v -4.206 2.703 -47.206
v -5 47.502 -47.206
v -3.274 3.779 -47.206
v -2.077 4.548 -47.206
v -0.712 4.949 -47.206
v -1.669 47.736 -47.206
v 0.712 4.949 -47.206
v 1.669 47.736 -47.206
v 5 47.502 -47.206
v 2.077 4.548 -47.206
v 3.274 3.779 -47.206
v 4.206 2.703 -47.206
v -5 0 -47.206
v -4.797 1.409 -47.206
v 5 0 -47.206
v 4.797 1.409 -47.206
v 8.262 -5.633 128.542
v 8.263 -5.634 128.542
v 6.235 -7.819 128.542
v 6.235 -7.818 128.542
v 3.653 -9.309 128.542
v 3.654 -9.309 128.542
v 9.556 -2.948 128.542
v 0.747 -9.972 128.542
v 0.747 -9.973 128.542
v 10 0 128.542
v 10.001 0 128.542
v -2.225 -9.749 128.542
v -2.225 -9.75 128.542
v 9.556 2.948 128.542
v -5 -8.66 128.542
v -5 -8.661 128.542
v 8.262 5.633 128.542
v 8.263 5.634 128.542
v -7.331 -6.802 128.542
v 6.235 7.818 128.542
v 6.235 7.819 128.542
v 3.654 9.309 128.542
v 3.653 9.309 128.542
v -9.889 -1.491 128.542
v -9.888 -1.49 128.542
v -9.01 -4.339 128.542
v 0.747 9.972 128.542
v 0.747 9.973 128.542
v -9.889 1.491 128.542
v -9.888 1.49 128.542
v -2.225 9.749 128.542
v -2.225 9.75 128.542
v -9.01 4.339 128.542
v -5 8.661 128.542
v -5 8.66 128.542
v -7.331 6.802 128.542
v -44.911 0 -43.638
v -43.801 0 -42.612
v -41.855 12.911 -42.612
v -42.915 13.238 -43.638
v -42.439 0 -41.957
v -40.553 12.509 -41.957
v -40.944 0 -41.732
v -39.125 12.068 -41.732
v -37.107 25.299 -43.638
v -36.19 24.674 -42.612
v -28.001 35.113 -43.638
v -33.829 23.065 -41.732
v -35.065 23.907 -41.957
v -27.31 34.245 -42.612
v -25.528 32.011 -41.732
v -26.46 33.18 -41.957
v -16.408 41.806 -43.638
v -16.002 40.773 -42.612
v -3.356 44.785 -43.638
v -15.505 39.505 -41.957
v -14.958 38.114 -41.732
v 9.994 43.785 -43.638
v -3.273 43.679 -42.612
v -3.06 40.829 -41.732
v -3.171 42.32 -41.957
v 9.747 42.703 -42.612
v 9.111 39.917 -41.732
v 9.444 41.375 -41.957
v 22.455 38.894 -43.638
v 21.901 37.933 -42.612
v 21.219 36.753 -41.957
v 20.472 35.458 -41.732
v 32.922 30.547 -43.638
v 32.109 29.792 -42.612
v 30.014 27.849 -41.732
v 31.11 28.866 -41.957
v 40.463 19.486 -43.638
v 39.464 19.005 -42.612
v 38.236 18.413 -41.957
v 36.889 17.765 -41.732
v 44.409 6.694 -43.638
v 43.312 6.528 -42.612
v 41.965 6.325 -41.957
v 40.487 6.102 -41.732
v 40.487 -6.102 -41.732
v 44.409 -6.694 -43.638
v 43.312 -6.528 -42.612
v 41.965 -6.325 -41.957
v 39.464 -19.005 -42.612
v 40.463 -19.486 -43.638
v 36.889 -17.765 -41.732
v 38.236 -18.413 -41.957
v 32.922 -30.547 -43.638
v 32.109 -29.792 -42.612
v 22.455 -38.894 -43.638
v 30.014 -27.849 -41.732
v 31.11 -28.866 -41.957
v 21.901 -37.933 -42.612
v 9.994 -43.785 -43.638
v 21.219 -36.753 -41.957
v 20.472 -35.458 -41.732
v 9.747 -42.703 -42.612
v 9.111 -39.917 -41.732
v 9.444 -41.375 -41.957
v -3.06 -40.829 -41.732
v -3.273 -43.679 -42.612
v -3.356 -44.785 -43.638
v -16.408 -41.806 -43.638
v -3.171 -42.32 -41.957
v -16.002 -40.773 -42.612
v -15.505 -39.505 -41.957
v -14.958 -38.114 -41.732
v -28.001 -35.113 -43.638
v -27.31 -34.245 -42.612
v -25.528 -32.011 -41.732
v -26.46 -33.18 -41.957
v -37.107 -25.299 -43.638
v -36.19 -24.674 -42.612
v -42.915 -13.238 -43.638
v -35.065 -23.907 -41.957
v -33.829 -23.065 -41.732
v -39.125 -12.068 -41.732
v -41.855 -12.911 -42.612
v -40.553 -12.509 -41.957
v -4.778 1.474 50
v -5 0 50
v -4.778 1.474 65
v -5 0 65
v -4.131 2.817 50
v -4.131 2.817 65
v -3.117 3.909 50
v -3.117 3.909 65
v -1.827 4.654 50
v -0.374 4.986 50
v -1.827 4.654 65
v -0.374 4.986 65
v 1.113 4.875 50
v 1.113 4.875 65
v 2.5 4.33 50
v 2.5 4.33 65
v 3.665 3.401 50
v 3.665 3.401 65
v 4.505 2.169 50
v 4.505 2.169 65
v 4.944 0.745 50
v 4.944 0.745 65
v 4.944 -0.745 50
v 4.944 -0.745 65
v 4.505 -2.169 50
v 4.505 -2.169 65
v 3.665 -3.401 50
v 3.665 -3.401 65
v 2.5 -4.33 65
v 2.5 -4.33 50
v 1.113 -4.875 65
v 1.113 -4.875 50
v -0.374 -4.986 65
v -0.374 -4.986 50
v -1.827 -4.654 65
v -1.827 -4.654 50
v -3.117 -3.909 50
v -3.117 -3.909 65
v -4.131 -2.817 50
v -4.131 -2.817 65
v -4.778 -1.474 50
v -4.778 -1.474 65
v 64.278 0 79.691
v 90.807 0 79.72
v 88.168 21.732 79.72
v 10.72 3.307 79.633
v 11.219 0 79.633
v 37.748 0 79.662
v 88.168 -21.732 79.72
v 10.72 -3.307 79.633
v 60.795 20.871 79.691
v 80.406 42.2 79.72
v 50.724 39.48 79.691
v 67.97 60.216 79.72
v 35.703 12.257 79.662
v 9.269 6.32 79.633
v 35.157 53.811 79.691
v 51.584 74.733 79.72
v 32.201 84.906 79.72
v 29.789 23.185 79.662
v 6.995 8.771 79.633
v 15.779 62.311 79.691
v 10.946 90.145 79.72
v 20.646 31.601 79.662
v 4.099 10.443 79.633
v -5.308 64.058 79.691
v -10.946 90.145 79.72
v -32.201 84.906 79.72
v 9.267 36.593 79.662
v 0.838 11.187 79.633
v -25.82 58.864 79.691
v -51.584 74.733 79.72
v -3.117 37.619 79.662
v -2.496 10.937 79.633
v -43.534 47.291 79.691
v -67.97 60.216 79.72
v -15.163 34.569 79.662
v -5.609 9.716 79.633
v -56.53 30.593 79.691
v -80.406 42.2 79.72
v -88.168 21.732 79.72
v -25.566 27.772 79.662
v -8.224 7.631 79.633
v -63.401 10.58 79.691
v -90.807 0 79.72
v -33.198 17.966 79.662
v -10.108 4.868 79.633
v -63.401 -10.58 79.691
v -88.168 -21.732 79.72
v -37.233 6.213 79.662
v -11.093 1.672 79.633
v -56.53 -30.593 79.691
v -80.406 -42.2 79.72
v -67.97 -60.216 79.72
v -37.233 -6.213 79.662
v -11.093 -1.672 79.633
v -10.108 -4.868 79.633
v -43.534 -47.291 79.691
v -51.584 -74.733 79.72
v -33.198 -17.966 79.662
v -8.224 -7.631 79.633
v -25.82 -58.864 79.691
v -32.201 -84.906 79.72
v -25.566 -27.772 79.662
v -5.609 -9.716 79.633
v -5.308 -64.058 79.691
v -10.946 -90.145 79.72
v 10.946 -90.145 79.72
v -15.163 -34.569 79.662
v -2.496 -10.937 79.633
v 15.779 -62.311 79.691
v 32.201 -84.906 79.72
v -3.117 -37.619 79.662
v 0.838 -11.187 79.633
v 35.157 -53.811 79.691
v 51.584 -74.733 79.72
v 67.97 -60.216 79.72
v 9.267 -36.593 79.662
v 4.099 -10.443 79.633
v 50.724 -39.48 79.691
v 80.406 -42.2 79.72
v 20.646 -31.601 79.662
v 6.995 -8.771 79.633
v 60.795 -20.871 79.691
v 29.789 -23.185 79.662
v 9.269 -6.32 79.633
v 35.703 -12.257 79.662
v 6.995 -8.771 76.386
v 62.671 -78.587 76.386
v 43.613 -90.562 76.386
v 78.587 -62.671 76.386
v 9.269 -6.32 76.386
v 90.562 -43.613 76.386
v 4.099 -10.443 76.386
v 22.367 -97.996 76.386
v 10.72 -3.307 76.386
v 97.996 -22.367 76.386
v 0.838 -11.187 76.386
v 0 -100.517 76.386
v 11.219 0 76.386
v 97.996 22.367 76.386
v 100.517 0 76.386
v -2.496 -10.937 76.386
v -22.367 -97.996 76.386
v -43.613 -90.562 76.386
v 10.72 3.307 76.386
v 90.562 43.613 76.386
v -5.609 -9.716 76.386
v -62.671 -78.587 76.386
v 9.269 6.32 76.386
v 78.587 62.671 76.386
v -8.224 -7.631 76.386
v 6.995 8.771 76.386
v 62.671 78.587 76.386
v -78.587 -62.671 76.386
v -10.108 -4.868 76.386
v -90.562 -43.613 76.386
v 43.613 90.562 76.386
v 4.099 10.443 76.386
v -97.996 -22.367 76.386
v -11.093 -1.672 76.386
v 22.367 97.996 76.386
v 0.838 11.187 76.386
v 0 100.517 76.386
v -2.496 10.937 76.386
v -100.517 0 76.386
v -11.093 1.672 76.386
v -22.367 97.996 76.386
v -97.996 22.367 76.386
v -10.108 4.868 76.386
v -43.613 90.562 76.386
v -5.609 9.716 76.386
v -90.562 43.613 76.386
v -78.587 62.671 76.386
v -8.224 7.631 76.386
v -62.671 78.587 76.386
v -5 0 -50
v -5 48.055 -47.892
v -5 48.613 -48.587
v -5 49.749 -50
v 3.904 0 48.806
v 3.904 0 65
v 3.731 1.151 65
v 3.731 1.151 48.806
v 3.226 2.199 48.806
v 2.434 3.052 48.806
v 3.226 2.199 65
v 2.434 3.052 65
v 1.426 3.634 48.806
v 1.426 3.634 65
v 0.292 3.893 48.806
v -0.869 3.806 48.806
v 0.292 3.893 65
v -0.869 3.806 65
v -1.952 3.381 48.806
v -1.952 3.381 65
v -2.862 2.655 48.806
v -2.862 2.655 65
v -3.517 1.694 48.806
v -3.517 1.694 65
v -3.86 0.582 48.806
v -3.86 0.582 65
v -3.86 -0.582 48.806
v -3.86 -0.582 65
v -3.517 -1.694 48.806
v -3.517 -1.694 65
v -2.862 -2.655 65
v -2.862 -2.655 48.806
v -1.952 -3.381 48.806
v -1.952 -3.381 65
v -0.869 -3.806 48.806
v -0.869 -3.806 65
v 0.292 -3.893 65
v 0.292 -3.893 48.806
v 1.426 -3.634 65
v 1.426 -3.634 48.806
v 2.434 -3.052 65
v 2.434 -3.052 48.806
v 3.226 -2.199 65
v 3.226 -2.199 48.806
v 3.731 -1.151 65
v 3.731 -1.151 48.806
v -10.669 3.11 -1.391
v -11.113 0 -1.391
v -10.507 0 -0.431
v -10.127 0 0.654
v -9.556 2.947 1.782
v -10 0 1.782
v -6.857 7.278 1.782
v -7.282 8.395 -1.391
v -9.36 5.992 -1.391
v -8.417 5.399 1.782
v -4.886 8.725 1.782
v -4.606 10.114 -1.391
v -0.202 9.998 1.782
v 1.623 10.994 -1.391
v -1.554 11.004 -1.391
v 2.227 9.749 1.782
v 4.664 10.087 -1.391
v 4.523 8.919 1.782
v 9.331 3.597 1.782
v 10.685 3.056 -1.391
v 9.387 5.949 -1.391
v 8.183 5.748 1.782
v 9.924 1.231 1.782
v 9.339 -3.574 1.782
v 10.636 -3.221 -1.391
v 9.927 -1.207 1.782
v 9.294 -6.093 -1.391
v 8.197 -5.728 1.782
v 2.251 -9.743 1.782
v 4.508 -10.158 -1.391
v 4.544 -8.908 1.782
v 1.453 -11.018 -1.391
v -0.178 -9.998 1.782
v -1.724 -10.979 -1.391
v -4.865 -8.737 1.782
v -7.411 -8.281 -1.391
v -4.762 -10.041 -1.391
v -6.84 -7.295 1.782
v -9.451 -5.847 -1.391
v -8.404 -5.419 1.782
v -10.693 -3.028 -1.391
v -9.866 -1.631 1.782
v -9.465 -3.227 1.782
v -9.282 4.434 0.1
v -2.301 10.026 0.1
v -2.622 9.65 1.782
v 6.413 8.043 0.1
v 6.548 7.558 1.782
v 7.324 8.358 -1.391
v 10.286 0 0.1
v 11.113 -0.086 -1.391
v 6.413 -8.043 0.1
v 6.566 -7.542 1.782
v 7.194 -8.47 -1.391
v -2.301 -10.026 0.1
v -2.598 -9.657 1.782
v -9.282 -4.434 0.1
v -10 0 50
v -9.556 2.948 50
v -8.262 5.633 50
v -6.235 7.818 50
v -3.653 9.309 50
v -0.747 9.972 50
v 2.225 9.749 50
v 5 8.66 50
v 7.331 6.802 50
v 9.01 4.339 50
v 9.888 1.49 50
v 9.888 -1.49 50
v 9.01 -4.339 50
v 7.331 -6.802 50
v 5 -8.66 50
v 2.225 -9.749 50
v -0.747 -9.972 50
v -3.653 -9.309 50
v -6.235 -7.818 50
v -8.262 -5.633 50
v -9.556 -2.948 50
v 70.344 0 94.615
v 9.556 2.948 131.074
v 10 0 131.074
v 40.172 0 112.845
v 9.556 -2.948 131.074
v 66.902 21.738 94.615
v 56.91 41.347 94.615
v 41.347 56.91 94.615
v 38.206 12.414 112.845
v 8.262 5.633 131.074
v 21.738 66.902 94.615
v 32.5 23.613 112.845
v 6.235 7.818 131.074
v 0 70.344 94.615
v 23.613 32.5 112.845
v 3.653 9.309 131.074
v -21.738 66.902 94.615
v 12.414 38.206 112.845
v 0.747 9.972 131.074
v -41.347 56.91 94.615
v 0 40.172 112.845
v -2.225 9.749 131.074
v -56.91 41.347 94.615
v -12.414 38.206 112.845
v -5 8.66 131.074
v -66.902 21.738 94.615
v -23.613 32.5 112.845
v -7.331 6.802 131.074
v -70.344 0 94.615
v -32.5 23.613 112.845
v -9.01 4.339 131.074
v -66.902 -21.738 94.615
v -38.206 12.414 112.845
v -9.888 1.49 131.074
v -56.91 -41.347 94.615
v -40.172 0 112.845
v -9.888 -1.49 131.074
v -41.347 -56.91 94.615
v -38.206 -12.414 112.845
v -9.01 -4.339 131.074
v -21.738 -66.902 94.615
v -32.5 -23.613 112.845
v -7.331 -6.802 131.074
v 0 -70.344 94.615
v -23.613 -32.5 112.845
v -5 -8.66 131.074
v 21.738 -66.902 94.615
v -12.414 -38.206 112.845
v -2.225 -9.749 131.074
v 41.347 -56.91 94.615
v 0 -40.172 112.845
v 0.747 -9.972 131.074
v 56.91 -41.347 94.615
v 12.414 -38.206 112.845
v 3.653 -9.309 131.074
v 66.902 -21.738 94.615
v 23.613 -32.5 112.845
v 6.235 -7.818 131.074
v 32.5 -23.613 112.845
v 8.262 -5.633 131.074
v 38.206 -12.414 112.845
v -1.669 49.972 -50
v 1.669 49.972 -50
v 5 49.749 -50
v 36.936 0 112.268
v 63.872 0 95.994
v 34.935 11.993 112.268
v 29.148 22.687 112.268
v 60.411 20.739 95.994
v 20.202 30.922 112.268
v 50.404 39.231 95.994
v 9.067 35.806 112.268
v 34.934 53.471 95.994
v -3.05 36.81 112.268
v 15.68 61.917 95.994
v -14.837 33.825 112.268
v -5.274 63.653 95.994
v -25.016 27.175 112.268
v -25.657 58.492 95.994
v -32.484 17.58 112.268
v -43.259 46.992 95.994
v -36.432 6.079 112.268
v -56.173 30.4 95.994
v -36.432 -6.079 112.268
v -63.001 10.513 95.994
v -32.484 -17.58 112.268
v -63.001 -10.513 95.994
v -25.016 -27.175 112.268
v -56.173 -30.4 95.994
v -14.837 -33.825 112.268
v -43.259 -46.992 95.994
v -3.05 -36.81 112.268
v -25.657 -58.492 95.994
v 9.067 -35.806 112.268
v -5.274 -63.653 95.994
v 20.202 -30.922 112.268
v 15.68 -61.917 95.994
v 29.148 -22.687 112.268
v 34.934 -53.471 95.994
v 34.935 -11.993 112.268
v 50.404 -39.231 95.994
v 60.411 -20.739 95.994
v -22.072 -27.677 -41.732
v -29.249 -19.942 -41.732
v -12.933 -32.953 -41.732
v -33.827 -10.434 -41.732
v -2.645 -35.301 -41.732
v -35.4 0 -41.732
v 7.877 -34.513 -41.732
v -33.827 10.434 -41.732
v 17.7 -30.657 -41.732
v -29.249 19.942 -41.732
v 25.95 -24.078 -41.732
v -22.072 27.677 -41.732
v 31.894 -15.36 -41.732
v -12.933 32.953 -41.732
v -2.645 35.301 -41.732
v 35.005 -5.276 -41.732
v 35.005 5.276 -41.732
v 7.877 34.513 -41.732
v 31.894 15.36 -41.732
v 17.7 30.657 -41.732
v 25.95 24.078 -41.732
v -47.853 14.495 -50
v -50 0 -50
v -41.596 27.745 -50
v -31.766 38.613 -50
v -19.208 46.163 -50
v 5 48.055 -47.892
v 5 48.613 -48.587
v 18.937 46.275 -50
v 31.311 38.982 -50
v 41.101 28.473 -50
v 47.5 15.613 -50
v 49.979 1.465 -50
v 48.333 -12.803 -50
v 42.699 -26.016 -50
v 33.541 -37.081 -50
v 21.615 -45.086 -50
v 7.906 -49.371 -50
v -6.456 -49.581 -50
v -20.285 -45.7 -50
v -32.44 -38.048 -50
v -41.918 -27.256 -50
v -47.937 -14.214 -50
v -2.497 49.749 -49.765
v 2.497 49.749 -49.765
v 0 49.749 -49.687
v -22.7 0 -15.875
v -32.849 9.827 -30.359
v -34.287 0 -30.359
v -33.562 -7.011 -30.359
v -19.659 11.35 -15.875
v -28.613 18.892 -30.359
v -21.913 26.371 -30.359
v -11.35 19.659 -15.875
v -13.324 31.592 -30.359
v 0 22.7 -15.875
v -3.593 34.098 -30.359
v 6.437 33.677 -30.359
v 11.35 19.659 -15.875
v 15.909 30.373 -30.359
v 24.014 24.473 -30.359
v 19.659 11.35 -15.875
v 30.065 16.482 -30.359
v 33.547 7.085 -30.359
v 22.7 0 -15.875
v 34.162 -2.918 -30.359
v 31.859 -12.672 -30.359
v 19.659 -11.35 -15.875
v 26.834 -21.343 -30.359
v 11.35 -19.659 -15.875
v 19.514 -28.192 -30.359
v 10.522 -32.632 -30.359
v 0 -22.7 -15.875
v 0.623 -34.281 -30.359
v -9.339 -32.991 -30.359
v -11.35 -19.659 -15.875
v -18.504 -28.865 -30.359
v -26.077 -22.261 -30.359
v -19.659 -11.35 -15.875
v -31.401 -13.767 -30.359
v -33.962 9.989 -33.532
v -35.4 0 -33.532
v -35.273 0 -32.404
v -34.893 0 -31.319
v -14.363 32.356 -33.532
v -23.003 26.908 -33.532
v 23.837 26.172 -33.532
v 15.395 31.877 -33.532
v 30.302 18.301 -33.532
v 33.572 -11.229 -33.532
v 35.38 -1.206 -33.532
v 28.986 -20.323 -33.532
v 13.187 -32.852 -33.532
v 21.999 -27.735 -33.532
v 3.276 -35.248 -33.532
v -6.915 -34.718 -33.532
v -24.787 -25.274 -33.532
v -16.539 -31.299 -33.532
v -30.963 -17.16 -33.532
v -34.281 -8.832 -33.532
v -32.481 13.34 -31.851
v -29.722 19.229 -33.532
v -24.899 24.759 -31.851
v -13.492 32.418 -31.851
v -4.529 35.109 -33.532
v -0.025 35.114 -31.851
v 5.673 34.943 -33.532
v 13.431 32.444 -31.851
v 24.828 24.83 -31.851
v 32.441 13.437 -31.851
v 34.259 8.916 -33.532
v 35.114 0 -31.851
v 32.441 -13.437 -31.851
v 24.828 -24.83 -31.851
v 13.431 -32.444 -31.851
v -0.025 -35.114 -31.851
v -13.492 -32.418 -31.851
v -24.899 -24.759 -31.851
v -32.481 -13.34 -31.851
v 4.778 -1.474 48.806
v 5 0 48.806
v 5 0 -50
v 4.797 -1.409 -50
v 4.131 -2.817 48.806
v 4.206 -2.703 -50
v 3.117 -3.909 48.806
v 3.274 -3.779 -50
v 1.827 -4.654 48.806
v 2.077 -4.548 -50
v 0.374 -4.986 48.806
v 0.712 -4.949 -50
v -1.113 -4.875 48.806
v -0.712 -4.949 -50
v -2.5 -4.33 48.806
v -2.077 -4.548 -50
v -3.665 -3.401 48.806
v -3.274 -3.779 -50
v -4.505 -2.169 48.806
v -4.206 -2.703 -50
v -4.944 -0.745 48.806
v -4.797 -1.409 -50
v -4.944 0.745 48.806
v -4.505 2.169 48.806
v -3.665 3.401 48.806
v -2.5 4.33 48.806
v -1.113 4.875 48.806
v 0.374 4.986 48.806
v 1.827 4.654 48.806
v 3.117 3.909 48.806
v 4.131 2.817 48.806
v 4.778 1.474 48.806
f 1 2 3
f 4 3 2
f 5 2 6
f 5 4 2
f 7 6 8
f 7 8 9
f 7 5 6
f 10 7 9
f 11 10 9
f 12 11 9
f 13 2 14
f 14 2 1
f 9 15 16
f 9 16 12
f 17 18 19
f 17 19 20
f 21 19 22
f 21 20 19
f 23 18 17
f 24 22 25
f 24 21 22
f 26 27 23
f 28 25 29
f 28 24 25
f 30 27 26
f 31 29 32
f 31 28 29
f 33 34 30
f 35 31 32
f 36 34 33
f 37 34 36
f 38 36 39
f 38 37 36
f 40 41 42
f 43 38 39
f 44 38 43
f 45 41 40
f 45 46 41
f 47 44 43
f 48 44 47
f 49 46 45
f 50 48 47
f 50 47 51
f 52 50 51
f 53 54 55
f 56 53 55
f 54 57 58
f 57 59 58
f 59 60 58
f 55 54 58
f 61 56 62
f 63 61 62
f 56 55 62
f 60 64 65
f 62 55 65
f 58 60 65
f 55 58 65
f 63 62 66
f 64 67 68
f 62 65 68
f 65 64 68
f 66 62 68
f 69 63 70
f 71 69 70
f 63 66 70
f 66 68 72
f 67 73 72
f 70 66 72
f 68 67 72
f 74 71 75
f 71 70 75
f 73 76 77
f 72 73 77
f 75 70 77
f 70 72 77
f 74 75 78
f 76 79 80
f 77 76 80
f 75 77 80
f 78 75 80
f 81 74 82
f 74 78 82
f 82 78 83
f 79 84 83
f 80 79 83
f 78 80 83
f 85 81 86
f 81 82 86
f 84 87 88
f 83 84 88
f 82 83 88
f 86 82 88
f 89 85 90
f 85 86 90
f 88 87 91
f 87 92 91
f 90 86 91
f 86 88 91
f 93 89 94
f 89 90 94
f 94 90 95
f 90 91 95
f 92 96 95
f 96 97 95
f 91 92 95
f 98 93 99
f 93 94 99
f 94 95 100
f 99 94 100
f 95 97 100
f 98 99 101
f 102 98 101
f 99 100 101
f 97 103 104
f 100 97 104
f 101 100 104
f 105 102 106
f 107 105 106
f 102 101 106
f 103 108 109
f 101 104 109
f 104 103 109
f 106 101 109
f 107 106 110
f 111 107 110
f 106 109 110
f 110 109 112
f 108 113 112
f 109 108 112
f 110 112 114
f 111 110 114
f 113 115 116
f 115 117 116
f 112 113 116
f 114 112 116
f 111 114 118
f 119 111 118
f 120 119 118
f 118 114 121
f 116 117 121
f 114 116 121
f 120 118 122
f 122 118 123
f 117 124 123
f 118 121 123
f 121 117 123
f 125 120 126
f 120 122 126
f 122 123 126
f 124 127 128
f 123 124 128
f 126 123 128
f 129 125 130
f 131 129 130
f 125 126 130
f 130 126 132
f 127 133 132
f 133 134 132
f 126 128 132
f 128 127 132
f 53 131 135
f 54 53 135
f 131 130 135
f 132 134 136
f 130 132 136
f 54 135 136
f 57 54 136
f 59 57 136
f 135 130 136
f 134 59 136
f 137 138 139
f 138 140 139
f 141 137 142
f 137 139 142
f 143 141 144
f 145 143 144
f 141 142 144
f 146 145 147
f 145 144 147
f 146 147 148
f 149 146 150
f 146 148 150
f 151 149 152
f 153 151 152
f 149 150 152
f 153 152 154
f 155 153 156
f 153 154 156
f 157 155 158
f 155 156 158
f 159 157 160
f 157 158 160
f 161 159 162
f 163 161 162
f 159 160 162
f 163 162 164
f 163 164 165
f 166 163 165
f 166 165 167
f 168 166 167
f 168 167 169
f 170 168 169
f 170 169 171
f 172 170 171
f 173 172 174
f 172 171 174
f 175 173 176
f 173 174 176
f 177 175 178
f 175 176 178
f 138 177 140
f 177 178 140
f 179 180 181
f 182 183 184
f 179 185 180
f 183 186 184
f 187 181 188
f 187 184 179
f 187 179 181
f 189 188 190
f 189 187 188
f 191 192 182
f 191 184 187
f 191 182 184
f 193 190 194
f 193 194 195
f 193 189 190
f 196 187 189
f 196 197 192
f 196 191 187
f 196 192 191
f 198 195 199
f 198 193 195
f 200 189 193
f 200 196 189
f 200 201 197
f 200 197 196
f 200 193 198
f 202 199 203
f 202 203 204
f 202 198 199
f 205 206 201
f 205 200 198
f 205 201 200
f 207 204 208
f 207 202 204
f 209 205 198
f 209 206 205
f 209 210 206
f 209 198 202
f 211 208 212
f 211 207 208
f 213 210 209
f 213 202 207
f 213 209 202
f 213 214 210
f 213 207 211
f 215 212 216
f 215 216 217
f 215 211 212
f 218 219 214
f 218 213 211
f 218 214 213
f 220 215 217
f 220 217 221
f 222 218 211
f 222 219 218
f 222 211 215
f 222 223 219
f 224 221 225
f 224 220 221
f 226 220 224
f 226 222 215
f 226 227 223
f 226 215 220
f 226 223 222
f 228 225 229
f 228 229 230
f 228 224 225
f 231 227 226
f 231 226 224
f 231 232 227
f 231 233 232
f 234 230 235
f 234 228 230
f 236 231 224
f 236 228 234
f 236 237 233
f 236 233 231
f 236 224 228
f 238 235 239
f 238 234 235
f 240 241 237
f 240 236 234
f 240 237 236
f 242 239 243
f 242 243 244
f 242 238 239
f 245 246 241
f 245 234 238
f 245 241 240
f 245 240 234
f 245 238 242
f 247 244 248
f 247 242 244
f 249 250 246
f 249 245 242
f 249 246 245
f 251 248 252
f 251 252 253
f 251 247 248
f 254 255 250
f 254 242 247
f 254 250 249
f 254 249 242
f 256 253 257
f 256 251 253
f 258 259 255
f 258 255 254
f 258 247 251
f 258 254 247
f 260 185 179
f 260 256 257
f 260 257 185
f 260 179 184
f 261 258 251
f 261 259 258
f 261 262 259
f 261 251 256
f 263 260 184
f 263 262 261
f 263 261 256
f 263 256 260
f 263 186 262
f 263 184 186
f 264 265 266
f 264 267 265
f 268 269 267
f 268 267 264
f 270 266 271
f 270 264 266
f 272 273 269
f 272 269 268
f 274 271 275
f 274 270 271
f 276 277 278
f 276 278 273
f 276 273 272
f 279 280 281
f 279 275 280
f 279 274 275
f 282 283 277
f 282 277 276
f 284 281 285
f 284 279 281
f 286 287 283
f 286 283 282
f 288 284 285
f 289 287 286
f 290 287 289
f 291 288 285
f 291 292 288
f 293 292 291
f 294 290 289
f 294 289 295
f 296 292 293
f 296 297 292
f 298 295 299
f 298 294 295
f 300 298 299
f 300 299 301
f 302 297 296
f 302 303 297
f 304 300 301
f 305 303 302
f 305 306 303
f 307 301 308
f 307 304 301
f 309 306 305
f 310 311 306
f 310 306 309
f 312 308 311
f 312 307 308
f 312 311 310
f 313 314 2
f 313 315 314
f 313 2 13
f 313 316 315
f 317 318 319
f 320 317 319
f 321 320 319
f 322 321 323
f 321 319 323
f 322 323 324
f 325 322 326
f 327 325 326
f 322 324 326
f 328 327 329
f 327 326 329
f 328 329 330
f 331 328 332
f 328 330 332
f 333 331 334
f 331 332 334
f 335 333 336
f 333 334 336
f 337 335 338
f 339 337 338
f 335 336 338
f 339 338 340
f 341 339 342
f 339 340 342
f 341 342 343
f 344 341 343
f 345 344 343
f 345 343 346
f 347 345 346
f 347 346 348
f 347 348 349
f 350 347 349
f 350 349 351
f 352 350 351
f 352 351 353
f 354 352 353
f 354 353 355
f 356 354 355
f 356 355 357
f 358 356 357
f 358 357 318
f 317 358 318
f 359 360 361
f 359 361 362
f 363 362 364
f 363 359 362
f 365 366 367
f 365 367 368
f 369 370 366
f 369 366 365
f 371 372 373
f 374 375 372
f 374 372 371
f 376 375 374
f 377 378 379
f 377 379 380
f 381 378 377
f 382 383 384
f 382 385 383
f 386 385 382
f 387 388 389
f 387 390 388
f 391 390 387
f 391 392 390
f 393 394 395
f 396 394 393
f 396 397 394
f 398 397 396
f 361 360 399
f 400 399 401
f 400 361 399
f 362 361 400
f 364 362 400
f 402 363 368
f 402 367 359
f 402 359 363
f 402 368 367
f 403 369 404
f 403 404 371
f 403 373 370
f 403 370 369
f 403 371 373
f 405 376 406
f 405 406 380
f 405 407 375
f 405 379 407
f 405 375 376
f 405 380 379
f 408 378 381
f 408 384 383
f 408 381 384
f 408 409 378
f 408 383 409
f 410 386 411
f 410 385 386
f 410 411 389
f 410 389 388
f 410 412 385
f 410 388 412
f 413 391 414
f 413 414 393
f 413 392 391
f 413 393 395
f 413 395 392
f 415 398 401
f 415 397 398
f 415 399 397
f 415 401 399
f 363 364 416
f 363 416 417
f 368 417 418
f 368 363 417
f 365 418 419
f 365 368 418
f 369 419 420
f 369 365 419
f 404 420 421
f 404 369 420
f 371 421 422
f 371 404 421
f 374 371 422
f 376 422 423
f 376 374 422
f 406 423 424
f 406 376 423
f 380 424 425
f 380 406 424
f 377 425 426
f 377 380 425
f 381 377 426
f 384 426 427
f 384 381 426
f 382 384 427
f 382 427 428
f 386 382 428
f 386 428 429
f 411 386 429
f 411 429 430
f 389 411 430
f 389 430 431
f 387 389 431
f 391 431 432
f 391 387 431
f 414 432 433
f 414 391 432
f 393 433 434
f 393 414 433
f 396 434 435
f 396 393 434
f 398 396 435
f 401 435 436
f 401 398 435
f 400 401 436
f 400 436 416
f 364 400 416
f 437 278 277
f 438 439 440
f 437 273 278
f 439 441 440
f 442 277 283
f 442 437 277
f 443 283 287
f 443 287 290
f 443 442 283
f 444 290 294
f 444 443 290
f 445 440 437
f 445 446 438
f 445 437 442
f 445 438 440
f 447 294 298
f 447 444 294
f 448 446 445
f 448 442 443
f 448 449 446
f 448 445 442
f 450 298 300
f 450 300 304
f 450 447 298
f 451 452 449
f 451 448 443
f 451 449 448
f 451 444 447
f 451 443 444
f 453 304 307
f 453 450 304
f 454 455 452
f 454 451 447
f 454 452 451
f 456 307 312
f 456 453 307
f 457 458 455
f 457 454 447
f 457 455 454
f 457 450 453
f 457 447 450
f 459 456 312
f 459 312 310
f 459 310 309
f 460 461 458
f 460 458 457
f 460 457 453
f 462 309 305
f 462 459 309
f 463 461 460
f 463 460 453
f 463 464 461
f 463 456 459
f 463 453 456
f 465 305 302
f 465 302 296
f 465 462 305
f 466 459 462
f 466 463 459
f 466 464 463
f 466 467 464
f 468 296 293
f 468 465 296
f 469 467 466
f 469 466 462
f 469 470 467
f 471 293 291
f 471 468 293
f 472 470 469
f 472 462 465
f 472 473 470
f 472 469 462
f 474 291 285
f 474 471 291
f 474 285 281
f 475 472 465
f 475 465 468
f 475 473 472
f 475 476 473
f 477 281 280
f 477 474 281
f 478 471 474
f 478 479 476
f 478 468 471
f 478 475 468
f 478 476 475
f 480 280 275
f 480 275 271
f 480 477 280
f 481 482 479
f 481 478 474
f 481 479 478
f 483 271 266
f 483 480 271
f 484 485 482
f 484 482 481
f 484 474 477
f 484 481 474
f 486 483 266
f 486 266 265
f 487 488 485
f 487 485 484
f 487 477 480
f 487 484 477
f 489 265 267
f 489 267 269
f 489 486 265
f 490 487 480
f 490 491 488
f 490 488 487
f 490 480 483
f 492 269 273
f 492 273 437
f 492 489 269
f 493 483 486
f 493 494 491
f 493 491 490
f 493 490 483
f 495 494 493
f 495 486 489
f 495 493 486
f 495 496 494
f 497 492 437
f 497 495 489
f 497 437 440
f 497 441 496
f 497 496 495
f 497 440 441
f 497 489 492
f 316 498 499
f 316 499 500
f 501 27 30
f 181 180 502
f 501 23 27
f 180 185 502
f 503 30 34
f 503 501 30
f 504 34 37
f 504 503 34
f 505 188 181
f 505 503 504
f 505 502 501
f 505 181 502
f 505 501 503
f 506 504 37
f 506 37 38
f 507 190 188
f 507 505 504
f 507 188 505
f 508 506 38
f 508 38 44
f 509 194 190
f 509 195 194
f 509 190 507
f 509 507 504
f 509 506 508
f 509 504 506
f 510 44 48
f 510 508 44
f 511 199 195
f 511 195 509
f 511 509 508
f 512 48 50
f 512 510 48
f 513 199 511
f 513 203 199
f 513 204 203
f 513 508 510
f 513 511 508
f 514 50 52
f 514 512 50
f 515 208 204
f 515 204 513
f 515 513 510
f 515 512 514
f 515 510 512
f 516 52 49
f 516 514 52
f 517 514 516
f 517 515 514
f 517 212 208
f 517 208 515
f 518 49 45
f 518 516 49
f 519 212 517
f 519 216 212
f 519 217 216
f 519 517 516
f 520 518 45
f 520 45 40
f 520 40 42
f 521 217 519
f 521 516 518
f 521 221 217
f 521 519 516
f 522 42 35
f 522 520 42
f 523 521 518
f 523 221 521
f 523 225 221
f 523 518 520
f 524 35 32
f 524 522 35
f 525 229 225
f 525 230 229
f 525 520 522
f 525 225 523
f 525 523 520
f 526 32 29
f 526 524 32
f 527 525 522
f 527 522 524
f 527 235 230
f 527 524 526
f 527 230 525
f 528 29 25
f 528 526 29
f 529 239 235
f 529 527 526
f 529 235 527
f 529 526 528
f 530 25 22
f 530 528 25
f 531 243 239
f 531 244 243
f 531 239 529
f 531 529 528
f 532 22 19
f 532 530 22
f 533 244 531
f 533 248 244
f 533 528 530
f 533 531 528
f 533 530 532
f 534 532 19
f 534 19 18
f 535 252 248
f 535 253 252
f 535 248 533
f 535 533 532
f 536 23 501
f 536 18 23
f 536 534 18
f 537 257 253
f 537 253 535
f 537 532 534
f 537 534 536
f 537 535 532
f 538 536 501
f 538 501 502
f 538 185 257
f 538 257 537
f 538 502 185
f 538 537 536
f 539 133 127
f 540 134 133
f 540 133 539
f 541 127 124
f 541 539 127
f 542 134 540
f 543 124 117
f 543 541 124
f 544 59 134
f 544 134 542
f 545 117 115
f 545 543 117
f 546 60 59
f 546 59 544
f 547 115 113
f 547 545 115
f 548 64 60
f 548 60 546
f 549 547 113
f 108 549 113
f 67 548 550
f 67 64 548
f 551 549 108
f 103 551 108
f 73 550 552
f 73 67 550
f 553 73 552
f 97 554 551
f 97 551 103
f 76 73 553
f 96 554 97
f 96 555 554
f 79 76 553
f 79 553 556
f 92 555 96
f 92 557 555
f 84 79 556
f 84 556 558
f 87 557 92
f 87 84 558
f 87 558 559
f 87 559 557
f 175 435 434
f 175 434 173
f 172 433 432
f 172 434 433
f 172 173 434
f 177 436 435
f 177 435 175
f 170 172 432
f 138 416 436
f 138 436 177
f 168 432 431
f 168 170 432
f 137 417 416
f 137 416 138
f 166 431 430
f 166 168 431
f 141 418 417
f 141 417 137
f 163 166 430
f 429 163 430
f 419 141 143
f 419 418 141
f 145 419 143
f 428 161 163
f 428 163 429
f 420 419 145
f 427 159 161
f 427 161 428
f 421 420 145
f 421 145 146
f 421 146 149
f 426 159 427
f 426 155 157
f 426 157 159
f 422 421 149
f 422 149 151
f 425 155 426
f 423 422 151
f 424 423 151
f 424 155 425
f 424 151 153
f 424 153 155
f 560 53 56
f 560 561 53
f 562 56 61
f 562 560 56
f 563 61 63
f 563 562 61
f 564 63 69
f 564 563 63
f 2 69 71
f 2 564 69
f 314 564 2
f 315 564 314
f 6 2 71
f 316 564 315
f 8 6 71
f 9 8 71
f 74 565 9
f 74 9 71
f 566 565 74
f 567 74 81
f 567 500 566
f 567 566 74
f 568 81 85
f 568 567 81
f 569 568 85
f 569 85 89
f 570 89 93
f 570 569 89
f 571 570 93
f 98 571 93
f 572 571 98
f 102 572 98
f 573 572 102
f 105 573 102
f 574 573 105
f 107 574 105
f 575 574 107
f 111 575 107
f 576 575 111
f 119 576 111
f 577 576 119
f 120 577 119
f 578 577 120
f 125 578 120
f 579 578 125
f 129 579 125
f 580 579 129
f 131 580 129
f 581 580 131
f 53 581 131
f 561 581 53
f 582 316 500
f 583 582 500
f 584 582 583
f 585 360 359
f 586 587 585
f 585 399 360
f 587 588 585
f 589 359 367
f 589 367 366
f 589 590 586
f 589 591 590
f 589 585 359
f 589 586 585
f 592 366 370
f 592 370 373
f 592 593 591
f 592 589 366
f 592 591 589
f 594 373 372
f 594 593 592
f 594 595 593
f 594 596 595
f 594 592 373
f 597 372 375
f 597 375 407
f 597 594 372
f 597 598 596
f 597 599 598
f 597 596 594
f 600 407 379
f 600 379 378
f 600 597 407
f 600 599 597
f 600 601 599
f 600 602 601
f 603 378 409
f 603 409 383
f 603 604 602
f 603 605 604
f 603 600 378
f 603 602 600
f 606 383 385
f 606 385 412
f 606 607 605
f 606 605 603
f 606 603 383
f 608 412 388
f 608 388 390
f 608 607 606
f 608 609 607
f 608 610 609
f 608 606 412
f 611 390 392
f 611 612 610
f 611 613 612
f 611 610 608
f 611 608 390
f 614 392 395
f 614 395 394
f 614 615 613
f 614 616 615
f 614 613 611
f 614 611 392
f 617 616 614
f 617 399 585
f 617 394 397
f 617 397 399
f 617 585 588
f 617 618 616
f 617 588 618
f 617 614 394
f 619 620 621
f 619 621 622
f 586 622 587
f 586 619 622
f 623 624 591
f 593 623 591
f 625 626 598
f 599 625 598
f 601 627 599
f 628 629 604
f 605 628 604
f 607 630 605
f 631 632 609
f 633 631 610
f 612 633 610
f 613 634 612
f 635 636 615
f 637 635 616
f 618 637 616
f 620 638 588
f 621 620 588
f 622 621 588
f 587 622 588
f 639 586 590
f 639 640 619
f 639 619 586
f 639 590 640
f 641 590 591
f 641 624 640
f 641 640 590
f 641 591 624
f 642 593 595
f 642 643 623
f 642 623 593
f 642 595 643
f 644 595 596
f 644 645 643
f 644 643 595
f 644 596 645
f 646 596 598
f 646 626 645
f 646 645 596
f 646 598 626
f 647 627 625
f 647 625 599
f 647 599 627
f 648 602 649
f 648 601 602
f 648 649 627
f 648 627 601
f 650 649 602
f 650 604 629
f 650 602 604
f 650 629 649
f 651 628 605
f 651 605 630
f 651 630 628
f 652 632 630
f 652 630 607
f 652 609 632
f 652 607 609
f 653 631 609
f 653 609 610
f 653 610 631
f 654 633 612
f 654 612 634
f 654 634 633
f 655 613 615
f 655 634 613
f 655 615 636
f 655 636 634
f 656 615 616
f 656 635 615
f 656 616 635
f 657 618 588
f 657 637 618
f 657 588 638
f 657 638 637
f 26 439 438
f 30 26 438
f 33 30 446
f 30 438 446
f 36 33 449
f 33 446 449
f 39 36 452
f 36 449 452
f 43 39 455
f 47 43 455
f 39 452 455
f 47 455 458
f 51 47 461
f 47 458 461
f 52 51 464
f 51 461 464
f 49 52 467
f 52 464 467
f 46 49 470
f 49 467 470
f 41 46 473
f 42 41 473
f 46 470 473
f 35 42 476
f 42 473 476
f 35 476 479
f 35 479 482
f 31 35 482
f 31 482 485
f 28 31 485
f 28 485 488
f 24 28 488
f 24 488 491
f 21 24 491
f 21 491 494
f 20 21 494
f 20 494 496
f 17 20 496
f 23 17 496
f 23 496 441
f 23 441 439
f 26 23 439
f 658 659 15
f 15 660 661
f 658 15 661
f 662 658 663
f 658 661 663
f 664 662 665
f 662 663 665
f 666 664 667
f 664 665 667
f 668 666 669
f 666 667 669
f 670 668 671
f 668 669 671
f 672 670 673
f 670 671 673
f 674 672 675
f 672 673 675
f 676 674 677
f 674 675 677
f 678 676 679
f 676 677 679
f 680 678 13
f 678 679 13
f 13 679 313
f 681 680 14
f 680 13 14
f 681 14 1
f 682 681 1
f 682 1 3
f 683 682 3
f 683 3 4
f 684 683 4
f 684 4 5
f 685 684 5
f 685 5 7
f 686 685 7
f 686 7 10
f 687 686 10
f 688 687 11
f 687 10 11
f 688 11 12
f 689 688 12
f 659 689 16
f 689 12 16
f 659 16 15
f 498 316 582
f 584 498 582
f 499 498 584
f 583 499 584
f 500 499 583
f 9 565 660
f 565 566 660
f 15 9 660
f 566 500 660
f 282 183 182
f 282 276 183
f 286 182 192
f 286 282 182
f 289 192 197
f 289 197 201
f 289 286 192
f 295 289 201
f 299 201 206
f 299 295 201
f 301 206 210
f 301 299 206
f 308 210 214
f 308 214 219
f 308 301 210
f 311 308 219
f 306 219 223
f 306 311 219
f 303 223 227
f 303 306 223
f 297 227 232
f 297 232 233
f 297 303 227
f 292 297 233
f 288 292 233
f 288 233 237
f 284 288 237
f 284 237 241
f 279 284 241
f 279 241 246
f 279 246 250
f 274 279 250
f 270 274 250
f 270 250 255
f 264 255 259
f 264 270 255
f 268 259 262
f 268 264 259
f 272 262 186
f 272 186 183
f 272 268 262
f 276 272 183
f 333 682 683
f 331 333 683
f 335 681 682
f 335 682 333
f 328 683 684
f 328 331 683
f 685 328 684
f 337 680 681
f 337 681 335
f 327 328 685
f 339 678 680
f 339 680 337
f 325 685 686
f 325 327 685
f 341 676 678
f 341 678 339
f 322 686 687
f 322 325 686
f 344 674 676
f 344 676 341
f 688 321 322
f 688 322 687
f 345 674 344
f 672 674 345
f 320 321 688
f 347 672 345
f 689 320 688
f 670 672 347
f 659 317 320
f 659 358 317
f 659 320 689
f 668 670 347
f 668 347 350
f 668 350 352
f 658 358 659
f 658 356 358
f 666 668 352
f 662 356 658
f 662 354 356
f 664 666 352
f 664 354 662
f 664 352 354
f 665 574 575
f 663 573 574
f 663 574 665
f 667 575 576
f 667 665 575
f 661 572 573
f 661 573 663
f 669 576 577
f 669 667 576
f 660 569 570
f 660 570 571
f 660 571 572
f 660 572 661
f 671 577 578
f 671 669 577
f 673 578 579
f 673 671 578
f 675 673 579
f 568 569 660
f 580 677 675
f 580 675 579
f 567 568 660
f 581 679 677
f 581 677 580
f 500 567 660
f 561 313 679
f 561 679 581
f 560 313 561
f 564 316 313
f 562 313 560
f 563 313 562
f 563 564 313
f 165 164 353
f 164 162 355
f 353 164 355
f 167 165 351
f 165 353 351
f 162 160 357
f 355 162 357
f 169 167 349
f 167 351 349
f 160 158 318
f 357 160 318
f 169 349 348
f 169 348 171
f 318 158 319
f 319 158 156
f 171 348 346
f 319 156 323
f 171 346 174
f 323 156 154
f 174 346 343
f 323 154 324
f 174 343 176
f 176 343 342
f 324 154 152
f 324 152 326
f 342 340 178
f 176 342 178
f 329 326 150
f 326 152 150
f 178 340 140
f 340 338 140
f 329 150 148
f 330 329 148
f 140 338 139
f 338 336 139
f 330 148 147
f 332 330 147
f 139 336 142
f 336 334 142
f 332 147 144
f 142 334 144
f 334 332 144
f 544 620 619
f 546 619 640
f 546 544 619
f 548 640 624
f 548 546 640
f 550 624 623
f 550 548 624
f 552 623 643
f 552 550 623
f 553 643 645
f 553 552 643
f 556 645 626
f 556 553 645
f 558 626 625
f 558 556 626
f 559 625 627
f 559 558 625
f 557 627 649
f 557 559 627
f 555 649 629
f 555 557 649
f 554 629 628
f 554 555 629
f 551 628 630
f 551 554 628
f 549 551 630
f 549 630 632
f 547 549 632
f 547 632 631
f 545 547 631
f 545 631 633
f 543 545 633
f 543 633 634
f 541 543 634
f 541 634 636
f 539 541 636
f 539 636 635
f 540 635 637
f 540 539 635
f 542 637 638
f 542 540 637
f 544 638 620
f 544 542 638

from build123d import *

# Parameters (mm, degrees)
F0_W      = 5
F0_H      = 15
F2_R      = 5
F3_DEPTH  = 98.806
F4_R      = 3.904003
F5_DEPTH  = 18.034
F7_FACE_R = 10
F8_DEPTH  = 55.372
F9_R      = 5.08
F10_W     = 10
F10_H     = 49.749372
F11_DEPTH = 2.794


with BuildPart() as f1:
    # F0 (on Front) → F1 (revolve)
    with BuildSketch(Plane.XZ):
        Polygon((-50, -50), (0, -50), (0, 50), (-5, 50), (-10, 50), (-10, 0), (-35.400108, -31.750134), (-35.400108, -41.731834), (-43.385468, -41.731834), align=None)
        with Locations((-2.5, 57.5)):
            Rectangle(F0_W, F0_H)
    revolve(axis=Axis((0, 0, 57.5), (0, 0, -1)))

    # F2 (on face) → F3 (cut)
    with BuildSketch(Plane(origin=(0, 0, -50), x_dir=(1, 0, 0), z_dir=(0, 0, -1))):
        Circle(F2_R)
    extrude(amount=-F3_DEPTH, mode=Mode.SUBTRACT)

    # F4 (on face) → F5 (cut)
    with BuildSketch(Plane.XY.offset(65)):
        Circle(F4_R)
    extrude(amount=-F5_DEPTH, mode=Mode.SUBTRACT)

    # F9
    f9_edges = [f1.edges().sort_by_distance(p)[0] for p in [
        (35.400108, 0, -31.750134),
        (43.385468, 0, -41.731834),
        (10, 0, 0),
        (-22.700054, 0, -15.875067),
    ]]
    fillet(f9_edges, radius=F9_R)

    # F10 (on face) → F11 (cut)
    with BuildSketch(Plane(origin=(0, 0, -50), x_dir=(1, 0, 0), z_dir=(0, 0, -1))):
        with Locations((0, -24.874686)):
            Rectangle(F10_W, F10_H)
    extrude(amount=-F11_DEPTH, mode=Mode.SUBTRACT)


with BuildPart() as f7:
    # F6 (on Front) → F7 (revolve)
    with BuildSketch(Plane.XZ):
        Polygon((11.21857, 76.385638), (100.516607, 76.385638), (10, 131.074205), (0, 131.074205), (0, 128.542006), (10.000754, 128.542006), (90.807095, 79.720214), (11.21857, 79.633221), align=None)
    revolve(axis=Axis((0, 0, 82.398443), (0, 0, 1)))

    # F7_face (on face) → F8 (cut)
    with BuildSketch(Plane.XY.offset(131.074205)):
        Circle(F7_FACE_R)
    extrude(amount=-F8_DEPTH, mode=Mode.SUBTRACT)


solid = Compound([f1.part, f7.part])
